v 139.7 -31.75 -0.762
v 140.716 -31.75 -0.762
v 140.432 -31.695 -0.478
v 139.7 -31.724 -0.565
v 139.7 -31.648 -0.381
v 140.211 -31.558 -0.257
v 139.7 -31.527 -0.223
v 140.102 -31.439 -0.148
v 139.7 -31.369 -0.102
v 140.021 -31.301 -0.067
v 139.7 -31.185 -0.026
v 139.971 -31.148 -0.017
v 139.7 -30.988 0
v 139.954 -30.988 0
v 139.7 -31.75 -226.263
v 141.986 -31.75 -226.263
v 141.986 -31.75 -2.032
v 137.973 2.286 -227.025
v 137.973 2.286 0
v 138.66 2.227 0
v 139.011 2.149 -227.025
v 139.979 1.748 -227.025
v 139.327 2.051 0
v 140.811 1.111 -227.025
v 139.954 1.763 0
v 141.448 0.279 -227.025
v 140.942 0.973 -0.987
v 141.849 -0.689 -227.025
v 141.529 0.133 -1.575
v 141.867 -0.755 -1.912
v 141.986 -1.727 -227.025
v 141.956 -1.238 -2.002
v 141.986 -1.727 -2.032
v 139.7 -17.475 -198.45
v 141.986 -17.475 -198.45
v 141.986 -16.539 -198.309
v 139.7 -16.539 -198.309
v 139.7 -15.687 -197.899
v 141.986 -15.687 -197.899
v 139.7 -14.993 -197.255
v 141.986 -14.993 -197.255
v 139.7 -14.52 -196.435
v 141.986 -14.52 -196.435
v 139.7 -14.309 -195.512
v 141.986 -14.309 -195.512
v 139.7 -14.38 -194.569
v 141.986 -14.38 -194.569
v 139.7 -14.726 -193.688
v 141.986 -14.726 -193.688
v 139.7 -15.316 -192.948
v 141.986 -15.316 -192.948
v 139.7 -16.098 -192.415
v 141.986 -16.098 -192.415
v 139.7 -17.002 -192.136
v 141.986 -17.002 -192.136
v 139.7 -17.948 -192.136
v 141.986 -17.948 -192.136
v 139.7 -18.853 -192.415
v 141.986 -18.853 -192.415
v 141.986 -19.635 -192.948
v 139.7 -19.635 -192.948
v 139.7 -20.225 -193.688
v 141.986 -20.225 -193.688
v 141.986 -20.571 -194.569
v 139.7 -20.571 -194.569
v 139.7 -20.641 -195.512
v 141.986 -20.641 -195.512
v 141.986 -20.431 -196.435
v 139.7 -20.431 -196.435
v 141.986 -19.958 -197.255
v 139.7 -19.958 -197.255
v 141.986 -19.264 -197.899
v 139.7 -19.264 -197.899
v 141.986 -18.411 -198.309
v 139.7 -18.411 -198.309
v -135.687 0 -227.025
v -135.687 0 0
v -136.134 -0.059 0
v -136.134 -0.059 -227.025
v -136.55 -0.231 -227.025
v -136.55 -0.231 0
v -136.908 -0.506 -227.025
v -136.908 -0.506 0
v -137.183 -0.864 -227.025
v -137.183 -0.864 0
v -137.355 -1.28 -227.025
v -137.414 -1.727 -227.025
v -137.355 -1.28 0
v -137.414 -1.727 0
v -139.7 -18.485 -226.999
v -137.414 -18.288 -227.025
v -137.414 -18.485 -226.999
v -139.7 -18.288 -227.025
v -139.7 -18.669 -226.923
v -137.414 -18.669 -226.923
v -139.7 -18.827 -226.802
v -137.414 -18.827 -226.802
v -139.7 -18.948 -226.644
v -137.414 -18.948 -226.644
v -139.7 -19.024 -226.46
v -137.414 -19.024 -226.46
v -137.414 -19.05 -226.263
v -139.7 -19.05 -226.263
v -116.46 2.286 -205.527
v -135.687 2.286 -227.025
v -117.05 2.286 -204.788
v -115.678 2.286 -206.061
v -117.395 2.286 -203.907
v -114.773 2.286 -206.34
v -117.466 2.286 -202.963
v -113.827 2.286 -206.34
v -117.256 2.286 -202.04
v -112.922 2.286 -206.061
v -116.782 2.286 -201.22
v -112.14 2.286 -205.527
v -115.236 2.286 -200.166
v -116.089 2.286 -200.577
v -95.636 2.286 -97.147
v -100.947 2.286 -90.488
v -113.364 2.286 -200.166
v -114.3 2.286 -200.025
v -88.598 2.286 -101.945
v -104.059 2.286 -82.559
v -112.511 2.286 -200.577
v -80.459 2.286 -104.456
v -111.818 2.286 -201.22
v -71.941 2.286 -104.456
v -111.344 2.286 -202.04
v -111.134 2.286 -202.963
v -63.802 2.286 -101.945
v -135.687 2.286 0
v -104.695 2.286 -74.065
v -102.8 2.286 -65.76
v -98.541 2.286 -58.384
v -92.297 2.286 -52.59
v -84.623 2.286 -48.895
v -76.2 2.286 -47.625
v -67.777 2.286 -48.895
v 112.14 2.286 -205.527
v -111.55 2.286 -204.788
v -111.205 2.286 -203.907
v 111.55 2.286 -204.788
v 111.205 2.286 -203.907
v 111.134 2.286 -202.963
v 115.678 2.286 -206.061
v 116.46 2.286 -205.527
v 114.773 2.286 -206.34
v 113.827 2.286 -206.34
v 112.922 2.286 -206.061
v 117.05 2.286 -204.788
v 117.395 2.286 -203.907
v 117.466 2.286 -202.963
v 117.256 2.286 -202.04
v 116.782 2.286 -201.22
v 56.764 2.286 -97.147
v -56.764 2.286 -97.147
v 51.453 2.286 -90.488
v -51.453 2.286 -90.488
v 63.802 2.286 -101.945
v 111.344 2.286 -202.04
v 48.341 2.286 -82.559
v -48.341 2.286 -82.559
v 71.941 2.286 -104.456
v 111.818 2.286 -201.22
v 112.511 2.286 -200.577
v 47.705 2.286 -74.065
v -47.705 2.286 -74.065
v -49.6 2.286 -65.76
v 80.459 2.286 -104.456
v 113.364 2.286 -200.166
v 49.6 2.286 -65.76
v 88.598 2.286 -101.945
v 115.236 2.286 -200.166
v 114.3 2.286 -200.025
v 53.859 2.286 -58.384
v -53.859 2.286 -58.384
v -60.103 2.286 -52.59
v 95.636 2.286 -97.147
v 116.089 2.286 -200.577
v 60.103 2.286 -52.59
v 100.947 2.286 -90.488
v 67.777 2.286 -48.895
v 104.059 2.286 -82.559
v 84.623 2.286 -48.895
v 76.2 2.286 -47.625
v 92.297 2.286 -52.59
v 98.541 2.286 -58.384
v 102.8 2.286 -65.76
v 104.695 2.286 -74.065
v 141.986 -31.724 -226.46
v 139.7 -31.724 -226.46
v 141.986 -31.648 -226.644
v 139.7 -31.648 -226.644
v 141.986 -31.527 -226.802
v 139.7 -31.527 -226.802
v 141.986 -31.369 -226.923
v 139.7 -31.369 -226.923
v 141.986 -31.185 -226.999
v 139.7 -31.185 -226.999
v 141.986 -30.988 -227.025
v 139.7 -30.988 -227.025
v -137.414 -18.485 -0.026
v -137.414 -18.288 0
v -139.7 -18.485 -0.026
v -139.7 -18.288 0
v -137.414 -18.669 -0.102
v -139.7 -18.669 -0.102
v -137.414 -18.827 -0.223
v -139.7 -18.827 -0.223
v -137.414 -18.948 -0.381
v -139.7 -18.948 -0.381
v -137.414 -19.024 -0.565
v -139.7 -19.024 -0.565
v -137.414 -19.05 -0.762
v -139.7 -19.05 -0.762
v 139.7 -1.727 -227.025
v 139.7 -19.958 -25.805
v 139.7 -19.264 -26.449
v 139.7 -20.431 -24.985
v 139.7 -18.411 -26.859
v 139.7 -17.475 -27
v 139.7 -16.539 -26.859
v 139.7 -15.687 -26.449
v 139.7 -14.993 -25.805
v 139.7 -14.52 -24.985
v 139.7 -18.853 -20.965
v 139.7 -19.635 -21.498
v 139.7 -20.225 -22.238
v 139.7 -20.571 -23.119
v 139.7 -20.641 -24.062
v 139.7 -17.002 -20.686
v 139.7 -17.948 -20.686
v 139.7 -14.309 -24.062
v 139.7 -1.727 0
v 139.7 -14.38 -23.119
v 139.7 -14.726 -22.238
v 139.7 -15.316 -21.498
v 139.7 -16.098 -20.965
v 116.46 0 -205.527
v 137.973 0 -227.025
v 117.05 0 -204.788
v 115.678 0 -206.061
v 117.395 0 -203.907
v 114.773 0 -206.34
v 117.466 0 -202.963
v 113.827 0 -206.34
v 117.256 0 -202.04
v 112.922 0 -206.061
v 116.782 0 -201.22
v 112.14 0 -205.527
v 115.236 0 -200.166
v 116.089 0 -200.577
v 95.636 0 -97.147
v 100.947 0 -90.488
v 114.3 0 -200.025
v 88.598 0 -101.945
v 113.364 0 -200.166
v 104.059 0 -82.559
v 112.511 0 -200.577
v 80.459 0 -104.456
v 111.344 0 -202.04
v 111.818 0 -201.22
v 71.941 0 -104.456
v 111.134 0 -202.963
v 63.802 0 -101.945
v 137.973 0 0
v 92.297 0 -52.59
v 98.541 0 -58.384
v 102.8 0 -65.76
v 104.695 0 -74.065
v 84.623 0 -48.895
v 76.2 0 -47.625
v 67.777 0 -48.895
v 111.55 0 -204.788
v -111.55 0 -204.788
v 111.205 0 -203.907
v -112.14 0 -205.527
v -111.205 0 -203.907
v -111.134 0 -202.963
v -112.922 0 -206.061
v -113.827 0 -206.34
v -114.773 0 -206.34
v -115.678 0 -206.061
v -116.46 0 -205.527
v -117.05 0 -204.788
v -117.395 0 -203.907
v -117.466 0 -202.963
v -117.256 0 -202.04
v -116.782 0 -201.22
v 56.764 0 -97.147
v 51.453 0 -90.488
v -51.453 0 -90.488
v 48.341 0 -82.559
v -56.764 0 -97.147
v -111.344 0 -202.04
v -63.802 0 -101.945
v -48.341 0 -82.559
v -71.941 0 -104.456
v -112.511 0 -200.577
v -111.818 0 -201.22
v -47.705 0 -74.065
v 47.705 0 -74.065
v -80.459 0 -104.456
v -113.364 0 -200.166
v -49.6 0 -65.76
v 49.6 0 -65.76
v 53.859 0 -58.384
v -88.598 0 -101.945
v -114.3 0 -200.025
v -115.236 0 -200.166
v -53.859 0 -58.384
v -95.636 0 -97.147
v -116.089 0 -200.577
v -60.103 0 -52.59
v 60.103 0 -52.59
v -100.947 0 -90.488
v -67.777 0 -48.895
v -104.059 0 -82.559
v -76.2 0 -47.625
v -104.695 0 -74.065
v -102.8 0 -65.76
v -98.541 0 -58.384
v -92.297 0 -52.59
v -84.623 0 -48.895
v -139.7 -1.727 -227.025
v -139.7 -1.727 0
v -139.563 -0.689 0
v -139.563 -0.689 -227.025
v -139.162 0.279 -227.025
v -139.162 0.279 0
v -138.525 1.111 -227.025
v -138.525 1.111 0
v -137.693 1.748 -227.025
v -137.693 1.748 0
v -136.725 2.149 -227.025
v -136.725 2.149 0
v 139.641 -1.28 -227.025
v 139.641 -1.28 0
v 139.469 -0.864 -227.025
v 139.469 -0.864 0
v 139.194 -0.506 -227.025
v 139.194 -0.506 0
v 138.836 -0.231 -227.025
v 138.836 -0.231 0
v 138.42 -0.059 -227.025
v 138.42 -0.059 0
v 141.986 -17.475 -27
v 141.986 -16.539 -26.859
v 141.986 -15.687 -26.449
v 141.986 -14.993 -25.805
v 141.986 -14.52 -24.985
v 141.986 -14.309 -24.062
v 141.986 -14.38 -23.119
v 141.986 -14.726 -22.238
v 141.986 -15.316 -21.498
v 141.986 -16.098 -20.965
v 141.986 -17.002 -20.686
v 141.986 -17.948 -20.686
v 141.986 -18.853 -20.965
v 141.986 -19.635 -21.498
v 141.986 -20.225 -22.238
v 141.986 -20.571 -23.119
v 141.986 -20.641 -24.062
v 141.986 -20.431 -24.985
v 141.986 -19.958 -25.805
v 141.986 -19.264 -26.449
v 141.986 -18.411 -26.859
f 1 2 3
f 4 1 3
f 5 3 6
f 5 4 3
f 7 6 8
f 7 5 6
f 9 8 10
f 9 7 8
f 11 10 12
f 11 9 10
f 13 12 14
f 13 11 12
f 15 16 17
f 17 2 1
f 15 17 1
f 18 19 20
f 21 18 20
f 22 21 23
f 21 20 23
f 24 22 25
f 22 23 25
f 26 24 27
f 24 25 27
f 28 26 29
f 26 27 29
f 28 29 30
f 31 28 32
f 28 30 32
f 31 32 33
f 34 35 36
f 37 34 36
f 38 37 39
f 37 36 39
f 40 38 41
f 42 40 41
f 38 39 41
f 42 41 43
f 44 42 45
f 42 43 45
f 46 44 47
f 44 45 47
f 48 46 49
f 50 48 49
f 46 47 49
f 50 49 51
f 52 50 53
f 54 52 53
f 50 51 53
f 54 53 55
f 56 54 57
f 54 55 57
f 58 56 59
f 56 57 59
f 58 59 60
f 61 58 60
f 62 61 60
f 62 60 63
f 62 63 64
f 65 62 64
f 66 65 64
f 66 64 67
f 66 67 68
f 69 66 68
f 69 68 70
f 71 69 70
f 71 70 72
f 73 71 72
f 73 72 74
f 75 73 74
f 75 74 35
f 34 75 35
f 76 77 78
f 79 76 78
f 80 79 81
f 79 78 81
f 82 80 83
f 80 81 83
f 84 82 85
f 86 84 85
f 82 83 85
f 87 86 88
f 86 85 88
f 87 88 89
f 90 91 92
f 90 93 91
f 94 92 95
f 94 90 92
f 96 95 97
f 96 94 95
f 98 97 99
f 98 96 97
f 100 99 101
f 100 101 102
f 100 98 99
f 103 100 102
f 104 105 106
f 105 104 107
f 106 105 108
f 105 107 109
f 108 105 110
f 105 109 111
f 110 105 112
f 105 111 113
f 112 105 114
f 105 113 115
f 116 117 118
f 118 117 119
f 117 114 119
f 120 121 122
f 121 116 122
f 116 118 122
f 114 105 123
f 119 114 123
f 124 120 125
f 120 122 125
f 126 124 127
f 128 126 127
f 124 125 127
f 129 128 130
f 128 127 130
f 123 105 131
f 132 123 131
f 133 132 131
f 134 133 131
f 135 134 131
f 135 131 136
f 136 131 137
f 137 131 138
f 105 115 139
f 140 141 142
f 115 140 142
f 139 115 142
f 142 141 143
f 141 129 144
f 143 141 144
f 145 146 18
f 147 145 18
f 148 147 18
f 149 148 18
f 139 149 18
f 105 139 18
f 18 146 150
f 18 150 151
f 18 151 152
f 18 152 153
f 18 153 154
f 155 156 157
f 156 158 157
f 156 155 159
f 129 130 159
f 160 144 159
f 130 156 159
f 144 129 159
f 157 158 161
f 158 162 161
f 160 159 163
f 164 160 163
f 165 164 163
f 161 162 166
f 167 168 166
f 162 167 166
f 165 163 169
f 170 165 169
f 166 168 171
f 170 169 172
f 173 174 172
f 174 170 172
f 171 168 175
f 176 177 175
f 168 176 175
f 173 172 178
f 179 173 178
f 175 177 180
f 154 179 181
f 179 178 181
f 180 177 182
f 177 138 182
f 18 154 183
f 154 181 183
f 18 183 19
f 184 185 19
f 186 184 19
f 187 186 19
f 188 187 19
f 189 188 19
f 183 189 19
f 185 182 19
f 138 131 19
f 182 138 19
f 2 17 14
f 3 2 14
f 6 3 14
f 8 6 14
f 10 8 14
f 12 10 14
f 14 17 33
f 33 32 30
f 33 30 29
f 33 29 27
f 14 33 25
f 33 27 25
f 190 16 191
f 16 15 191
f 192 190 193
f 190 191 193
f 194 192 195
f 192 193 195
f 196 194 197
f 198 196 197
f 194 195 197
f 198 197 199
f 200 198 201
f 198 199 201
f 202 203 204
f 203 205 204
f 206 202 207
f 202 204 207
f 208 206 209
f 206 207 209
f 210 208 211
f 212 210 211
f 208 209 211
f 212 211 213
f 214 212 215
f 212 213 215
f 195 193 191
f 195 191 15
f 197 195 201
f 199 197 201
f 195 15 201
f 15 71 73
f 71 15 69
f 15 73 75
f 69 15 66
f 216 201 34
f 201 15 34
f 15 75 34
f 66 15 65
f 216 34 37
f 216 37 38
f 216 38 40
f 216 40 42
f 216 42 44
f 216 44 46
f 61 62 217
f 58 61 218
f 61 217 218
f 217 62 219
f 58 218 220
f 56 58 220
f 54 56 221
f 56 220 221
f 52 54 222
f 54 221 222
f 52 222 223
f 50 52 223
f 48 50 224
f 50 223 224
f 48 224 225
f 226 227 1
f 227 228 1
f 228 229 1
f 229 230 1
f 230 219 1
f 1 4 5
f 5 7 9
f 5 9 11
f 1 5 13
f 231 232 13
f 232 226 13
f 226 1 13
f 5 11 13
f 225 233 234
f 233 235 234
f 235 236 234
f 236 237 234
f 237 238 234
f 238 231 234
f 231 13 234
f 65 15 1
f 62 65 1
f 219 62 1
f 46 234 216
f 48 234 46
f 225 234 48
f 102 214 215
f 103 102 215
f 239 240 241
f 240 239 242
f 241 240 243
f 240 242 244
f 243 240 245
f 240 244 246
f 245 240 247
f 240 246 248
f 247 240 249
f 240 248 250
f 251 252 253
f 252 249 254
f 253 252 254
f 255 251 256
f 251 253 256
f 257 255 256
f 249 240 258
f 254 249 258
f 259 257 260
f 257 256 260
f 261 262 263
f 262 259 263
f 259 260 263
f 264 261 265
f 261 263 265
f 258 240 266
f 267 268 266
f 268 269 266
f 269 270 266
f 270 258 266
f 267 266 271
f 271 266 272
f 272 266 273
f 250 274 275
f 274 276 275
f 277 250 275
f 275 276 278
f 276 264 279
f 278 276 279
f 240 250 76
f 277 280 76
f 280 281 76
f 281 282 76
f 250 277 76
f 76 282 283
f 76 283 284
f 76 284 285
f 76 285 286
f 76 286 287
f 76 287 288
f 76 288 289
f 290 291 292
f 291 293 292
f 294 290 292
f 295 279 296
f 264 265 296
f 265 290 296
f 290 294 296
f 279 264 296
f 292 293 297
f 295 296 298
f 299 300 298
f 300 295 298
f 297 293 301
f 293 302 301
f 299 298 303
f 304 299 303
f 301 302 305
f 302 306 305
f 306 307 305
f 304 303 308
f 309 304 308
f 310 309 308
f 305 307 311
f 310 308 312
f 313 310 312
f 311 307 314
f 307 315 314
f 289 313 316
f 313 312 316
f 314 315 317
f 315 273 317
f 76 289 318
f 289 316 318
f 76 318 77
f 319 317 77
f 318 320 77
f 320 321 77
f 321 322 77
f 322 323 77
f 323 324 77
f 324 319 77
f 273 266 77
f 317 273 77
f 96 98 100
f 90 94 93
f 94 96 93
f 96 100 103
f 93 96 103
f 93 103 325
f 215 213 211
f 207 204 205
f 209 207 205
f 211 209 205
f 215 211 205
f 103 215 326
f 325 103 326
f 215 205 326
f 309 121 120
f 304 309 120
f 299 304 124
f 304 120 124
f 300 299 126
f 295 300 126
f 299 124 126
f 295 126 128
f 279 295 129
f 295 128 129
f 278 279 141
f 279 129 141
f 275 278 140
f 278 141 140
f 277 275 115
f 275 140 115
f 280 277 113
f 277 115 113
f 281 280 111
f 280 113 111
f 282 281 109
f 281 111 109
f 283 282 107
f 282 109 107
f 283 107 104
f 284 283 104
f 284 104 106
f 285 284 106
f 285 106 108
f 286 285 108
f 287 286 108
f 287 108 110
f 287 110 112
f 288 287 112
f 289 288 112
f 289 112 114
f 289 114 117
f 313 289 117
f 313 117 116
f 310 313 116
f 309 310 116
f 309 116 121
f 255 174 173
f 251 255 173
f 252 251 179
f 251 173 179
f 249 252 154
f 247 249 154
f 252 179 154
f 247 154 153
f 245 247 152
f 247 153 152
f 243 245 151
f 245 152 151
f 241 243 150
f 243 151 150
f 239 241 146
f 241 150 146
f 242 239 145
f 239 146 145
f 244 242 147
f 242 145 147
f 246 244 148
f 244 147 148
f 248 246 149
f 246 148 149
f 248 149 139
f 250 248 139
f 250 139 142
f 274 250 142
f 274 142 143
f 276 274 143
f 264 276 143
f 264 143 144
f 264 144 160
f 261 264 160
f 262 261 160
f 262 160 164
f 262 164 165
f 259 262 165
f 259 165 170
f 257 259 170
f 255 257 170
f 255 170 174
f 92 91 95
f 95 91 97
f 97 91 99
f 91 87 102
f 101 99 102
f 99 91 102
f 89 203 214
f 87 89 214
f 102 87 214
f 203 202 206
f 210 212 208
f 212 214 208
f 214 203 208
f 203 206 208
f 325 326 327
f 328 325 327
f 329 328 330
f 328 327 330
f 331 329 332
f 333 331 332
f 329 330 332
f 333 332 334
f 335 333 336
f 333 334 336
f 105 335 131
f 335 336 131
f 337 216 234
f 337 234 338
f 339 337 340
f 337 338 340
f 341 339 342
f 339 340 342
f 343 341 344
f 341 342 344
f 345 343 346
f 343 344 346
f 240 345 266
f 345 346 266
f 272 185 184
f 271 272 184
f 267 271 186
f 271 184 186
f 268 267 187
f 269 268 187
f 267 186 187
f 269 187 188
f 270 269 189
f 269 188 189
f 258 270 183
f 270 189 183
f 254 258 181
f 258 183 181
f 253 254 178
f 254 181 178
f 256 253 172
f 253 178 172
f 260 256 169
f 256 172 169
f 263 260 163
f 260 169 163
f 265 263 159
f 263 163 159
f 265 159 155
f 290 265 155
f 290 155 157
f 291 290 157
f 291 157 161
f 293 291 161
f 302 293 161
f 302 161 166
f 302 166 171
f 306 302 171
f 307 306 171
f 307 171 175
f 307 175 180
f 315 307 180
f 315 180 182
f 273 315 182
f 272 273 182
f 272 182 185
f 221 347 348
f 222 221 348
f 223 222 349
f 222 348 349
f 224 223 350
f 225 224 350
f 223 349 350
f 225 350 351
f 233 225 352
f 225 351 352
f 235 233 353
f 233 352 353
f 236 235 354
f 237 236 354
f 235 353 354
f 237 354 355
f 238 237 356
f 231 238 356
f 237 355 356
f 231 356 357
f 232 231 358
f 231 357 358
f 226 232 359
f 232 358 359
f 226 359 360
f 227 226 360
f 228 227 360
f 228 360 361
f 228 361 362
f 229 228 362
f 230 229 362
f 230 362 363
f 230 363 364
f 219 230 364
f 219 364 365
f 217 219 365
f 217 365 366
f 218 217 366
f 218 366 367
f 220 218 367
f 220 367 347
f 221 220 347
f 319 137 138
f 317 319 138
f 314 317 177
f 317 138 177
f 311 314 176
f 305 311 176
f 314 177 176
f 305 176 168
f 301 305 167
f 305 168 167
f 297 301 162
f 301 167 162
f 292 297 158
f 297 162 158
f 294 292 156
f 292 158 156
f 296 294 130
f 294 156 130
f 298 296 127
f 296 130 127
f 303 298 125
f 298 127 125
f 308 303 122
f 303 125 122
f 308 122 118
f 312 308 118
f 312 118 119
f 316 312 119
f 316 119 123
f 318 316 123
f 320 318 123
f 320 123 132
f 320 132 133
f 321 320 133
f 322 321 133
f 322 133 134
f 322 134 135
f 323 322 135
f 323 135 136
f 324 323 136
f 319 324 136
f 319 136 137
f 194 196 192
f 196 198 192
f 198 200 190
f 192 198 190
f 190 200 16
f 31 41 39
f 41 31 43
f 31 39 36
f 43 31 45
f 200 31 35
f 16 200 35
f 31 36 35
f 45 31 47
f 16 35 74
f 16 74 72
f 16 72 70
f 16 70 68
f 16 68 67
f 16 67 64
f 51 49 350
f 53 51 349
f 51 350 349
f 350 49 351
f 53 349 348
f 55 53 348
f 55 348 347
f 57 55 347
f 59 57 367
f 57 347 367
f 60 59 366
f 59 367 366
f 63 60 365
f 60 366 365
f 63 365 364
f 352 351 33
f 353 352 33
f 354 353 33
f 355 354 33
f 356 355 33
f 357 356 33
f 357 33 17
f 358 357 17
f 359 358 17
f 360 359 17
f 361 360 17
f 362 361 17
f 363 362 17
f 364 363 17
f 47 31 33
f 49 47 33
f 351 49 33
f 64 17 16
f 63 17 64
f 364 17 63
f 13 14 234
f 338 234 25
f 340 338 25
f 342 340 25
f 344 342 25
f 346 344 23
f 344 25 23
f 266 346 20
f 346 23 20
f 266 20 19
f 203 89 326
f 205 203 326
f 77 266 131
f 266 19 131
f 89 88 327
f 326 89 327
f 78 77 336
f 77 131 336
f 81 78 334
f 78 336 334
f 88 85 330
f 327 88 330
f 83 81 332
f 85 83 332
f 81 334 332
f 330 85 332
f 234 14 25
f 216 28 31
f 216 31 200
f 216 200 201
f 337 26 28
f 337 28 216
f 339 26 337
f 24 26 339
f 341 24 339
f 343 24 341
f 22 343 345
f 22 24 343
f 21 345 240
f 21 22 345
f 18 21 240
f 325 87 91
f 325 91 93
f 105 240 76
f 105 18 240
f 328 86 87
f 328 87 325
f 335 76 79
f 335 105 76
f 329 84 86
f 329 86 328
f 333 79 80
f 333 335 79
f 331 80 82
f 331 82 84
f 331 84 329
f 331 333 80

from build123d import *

# Parameters (mm, degrees)
BASE_FLANGE1_DEPTH = 227.0252
CUT_EXTRUDE1_REACH = 271.924
SKETCH2_R          = 28.575
SKETCH2_R_2        = 3.175
SKETCH3_R          = 3.175
CUT_EXTRUDE2_DEPTH = 7.62
FILLET1_R          = 0.762
CUT_EXTRUDE3_DEPTH = 270.923905809


# Sheet-metal steps are written as plain solids
with BuildPart() as part:
    # Sketch1 → Base-Flange1 (new body)
    with BuildSketch(Plane(origin=(0, 0, 0), x_dir=(-1, 0, 0), z_dir=(0, 0, -1))):
        with BuildLine():
            Line((-139.7, -31.75), (-139.7, -1.7272))
            ThreePointArc((-139.7, -1.7272), (-139.194114832, -0.505885168), (-137.9728, 0))
            Line((-137.9728, 0), (135.6868, 0))
            ThreePointArc((135.6868, 0), (136.908114832, -0.505885168), (137.414, -1.7272))
            Line((137.414, -1.7272), (137.414, -19.05))
            Line((137.414, -19.05), (139.7, -19.05))
            Line((139.7, -19.05), (139.7, -1.7272))
            ThreePointArc((139.7, -1.7272), (138.524560934, 1.110560934), (135.6868, 2.286))
            Line((135.6868, 2.286), (-137.9728, 2.286))
            ThreePointArc((-137.9728, 2.286), (-140.810560934, 1.110560934), (-141.986, -1.7272))
            Line((-141.986, -1.7272), (-141.986, -31.75))
            Line((-141.986, -31.75), (-139.7, -31.75))
        make_face()
    extrude(amount=BASE_FLANGE1_DEPTH)

    # Sketch2 → Cut-Extrude1 (cut, up to next)
    with BuildSketch(Plane(origin=(0, 2.286, 0), x_dir=(1, 0, 0), z_dir=(0, 1, 0)), mode=Mode.PRIVATE) as cut_extrude1_sk1:
        with Locations(Location((-76.2, 76.2, 0), (0, 0, 270))):
            Circle(SKETCH2_R)
    cut_extrude1_tool1 = extrude(cut_extrude1_sk1.sketch, amount=-CUT_EXTRUDE1_REACH, mode=Mode.PRIVATE) & part.part
    # Sketch2 → Cut-Extrude1 (cut, up to next)
    with BuildSketch(Plane(origin=(0, 2.286, 0), x_dir=(1, 0, 0), z_dir=(0, 1, 0)), mode=Mode.PRIVATE) as cut_extrude1_sk2:
        with Locations(Location((76.2, 76.2, 0), (0, 0, 270))):
            Circle(SKETCH2_R)
    cut_extrude1_tool2 = extrude(cut_extrude1_sk2.sketch, amount=-CUT_EXTRUDE1_REACH, mode=Mode.PRIVATE) & part.part
    # Sketch2 → Cut-Extrude1 (cut, up to next)
    with BuildSketch(Plane(origin=(0, 2.286, 0), x_dir=(1, 0, 0), z_dir=(0, 1, 0)), mode=Mode.PRIVATE) as cut_extrude1_sk3:
        with Locations(Location((114.3, 203.2, 0), (0, 0, 270))):
            Circle(SKETCH2_R_2)
    cut_extrude1_tool3 = extrude(cut_extrude1_sk3.sketch, amount=-CUT_EXTRUDE1_REACH, mode=Mode.PRIVATE) & part.part
    # Sketch2 → Cut-Extrude1 (cut, up to next)
    with BuildSketch(Plane(origin=(0, 2.286, 0), x_dir=(1, 0, 0), z_dir=(0, 1, 0)), mode=Mode.PRIVATE) as cut_extrude1_sk4:
        with Locations(Location((-114.3, 203.2, 0), (0, 0, 270))):
            Circle(SKETCH2_R_2)
    cut_extrude1_tool4 = extrude(cut_extrude1_sk4.sketch, amount=-CUT_EXTRUDE1_REACH, mode=Mode.PRIVATE) & part.part
    add(cut_extrude1_tool1.solids().sort_by_distance((-76.2, 2.286, -76.2))[0], mode=Mode.SUBTRACT)
    add(cut_extrude1_tool2.solids().sort_by_distance((76.2, 2.286, -76.2))[0], mode=Mode.SUBTRACT)
    add(cut_extrude1_tool3.solids().sort_by_distance((114.3, 2.286, -203.2))[0], mode=Mode.SUBTRACT)
    add(cut_extrude1_tool4.solids().sort_by_distance((-114.3, 2.286, -203.2))[0], mode=Mode.SUBTRACT)

    # Sketch3 → Cut-Extrude2 (cut)
    with BuildSketch(Plane(origin=(141.986, 0, 0), x_dir=(0, 0, -1), z_dir=(1, 0, 0))):
        with Locations((23.8252, -17.4752)):
            Circle(SKETCH3_R)
        with Locations((195.2752, -17.4752)):
            Circle(SKETCH3_R)
    extrude(amount=-CUT_EXTRUDE2_DEPTH, mode=Mode.SUBTRACT)

    # Fillet1
    fillet1_edges = [part.edges().sort_by_distance(p)[0] for p in [
        (140.843, -31.75, 0),
        (-138.557, -19.05, 0),
        (140.843, -31.75, -227.0252),
        (-138.557, -19.05, -227.0252),
    ]]
    fillet(fillet1_edges, radius=FILLET1_R)

    # Sketch4 → Cut-Extrude3 (cut, through all)
    with BuildSketch(Plane(origin=(0, 2.286, 0), x_dir=(1, 0, 0), z_dir=(0, 1, 0))):
        Polygon((150.619782866, 10.665476011), (128.807714722, -11.146592133), (150.619782866, -11.146592133), align=None)
    extrude(amount=-CUT_EXTRUDE3_DEPTH, mode=Mode.SUBTRACT)


solid = part.part
